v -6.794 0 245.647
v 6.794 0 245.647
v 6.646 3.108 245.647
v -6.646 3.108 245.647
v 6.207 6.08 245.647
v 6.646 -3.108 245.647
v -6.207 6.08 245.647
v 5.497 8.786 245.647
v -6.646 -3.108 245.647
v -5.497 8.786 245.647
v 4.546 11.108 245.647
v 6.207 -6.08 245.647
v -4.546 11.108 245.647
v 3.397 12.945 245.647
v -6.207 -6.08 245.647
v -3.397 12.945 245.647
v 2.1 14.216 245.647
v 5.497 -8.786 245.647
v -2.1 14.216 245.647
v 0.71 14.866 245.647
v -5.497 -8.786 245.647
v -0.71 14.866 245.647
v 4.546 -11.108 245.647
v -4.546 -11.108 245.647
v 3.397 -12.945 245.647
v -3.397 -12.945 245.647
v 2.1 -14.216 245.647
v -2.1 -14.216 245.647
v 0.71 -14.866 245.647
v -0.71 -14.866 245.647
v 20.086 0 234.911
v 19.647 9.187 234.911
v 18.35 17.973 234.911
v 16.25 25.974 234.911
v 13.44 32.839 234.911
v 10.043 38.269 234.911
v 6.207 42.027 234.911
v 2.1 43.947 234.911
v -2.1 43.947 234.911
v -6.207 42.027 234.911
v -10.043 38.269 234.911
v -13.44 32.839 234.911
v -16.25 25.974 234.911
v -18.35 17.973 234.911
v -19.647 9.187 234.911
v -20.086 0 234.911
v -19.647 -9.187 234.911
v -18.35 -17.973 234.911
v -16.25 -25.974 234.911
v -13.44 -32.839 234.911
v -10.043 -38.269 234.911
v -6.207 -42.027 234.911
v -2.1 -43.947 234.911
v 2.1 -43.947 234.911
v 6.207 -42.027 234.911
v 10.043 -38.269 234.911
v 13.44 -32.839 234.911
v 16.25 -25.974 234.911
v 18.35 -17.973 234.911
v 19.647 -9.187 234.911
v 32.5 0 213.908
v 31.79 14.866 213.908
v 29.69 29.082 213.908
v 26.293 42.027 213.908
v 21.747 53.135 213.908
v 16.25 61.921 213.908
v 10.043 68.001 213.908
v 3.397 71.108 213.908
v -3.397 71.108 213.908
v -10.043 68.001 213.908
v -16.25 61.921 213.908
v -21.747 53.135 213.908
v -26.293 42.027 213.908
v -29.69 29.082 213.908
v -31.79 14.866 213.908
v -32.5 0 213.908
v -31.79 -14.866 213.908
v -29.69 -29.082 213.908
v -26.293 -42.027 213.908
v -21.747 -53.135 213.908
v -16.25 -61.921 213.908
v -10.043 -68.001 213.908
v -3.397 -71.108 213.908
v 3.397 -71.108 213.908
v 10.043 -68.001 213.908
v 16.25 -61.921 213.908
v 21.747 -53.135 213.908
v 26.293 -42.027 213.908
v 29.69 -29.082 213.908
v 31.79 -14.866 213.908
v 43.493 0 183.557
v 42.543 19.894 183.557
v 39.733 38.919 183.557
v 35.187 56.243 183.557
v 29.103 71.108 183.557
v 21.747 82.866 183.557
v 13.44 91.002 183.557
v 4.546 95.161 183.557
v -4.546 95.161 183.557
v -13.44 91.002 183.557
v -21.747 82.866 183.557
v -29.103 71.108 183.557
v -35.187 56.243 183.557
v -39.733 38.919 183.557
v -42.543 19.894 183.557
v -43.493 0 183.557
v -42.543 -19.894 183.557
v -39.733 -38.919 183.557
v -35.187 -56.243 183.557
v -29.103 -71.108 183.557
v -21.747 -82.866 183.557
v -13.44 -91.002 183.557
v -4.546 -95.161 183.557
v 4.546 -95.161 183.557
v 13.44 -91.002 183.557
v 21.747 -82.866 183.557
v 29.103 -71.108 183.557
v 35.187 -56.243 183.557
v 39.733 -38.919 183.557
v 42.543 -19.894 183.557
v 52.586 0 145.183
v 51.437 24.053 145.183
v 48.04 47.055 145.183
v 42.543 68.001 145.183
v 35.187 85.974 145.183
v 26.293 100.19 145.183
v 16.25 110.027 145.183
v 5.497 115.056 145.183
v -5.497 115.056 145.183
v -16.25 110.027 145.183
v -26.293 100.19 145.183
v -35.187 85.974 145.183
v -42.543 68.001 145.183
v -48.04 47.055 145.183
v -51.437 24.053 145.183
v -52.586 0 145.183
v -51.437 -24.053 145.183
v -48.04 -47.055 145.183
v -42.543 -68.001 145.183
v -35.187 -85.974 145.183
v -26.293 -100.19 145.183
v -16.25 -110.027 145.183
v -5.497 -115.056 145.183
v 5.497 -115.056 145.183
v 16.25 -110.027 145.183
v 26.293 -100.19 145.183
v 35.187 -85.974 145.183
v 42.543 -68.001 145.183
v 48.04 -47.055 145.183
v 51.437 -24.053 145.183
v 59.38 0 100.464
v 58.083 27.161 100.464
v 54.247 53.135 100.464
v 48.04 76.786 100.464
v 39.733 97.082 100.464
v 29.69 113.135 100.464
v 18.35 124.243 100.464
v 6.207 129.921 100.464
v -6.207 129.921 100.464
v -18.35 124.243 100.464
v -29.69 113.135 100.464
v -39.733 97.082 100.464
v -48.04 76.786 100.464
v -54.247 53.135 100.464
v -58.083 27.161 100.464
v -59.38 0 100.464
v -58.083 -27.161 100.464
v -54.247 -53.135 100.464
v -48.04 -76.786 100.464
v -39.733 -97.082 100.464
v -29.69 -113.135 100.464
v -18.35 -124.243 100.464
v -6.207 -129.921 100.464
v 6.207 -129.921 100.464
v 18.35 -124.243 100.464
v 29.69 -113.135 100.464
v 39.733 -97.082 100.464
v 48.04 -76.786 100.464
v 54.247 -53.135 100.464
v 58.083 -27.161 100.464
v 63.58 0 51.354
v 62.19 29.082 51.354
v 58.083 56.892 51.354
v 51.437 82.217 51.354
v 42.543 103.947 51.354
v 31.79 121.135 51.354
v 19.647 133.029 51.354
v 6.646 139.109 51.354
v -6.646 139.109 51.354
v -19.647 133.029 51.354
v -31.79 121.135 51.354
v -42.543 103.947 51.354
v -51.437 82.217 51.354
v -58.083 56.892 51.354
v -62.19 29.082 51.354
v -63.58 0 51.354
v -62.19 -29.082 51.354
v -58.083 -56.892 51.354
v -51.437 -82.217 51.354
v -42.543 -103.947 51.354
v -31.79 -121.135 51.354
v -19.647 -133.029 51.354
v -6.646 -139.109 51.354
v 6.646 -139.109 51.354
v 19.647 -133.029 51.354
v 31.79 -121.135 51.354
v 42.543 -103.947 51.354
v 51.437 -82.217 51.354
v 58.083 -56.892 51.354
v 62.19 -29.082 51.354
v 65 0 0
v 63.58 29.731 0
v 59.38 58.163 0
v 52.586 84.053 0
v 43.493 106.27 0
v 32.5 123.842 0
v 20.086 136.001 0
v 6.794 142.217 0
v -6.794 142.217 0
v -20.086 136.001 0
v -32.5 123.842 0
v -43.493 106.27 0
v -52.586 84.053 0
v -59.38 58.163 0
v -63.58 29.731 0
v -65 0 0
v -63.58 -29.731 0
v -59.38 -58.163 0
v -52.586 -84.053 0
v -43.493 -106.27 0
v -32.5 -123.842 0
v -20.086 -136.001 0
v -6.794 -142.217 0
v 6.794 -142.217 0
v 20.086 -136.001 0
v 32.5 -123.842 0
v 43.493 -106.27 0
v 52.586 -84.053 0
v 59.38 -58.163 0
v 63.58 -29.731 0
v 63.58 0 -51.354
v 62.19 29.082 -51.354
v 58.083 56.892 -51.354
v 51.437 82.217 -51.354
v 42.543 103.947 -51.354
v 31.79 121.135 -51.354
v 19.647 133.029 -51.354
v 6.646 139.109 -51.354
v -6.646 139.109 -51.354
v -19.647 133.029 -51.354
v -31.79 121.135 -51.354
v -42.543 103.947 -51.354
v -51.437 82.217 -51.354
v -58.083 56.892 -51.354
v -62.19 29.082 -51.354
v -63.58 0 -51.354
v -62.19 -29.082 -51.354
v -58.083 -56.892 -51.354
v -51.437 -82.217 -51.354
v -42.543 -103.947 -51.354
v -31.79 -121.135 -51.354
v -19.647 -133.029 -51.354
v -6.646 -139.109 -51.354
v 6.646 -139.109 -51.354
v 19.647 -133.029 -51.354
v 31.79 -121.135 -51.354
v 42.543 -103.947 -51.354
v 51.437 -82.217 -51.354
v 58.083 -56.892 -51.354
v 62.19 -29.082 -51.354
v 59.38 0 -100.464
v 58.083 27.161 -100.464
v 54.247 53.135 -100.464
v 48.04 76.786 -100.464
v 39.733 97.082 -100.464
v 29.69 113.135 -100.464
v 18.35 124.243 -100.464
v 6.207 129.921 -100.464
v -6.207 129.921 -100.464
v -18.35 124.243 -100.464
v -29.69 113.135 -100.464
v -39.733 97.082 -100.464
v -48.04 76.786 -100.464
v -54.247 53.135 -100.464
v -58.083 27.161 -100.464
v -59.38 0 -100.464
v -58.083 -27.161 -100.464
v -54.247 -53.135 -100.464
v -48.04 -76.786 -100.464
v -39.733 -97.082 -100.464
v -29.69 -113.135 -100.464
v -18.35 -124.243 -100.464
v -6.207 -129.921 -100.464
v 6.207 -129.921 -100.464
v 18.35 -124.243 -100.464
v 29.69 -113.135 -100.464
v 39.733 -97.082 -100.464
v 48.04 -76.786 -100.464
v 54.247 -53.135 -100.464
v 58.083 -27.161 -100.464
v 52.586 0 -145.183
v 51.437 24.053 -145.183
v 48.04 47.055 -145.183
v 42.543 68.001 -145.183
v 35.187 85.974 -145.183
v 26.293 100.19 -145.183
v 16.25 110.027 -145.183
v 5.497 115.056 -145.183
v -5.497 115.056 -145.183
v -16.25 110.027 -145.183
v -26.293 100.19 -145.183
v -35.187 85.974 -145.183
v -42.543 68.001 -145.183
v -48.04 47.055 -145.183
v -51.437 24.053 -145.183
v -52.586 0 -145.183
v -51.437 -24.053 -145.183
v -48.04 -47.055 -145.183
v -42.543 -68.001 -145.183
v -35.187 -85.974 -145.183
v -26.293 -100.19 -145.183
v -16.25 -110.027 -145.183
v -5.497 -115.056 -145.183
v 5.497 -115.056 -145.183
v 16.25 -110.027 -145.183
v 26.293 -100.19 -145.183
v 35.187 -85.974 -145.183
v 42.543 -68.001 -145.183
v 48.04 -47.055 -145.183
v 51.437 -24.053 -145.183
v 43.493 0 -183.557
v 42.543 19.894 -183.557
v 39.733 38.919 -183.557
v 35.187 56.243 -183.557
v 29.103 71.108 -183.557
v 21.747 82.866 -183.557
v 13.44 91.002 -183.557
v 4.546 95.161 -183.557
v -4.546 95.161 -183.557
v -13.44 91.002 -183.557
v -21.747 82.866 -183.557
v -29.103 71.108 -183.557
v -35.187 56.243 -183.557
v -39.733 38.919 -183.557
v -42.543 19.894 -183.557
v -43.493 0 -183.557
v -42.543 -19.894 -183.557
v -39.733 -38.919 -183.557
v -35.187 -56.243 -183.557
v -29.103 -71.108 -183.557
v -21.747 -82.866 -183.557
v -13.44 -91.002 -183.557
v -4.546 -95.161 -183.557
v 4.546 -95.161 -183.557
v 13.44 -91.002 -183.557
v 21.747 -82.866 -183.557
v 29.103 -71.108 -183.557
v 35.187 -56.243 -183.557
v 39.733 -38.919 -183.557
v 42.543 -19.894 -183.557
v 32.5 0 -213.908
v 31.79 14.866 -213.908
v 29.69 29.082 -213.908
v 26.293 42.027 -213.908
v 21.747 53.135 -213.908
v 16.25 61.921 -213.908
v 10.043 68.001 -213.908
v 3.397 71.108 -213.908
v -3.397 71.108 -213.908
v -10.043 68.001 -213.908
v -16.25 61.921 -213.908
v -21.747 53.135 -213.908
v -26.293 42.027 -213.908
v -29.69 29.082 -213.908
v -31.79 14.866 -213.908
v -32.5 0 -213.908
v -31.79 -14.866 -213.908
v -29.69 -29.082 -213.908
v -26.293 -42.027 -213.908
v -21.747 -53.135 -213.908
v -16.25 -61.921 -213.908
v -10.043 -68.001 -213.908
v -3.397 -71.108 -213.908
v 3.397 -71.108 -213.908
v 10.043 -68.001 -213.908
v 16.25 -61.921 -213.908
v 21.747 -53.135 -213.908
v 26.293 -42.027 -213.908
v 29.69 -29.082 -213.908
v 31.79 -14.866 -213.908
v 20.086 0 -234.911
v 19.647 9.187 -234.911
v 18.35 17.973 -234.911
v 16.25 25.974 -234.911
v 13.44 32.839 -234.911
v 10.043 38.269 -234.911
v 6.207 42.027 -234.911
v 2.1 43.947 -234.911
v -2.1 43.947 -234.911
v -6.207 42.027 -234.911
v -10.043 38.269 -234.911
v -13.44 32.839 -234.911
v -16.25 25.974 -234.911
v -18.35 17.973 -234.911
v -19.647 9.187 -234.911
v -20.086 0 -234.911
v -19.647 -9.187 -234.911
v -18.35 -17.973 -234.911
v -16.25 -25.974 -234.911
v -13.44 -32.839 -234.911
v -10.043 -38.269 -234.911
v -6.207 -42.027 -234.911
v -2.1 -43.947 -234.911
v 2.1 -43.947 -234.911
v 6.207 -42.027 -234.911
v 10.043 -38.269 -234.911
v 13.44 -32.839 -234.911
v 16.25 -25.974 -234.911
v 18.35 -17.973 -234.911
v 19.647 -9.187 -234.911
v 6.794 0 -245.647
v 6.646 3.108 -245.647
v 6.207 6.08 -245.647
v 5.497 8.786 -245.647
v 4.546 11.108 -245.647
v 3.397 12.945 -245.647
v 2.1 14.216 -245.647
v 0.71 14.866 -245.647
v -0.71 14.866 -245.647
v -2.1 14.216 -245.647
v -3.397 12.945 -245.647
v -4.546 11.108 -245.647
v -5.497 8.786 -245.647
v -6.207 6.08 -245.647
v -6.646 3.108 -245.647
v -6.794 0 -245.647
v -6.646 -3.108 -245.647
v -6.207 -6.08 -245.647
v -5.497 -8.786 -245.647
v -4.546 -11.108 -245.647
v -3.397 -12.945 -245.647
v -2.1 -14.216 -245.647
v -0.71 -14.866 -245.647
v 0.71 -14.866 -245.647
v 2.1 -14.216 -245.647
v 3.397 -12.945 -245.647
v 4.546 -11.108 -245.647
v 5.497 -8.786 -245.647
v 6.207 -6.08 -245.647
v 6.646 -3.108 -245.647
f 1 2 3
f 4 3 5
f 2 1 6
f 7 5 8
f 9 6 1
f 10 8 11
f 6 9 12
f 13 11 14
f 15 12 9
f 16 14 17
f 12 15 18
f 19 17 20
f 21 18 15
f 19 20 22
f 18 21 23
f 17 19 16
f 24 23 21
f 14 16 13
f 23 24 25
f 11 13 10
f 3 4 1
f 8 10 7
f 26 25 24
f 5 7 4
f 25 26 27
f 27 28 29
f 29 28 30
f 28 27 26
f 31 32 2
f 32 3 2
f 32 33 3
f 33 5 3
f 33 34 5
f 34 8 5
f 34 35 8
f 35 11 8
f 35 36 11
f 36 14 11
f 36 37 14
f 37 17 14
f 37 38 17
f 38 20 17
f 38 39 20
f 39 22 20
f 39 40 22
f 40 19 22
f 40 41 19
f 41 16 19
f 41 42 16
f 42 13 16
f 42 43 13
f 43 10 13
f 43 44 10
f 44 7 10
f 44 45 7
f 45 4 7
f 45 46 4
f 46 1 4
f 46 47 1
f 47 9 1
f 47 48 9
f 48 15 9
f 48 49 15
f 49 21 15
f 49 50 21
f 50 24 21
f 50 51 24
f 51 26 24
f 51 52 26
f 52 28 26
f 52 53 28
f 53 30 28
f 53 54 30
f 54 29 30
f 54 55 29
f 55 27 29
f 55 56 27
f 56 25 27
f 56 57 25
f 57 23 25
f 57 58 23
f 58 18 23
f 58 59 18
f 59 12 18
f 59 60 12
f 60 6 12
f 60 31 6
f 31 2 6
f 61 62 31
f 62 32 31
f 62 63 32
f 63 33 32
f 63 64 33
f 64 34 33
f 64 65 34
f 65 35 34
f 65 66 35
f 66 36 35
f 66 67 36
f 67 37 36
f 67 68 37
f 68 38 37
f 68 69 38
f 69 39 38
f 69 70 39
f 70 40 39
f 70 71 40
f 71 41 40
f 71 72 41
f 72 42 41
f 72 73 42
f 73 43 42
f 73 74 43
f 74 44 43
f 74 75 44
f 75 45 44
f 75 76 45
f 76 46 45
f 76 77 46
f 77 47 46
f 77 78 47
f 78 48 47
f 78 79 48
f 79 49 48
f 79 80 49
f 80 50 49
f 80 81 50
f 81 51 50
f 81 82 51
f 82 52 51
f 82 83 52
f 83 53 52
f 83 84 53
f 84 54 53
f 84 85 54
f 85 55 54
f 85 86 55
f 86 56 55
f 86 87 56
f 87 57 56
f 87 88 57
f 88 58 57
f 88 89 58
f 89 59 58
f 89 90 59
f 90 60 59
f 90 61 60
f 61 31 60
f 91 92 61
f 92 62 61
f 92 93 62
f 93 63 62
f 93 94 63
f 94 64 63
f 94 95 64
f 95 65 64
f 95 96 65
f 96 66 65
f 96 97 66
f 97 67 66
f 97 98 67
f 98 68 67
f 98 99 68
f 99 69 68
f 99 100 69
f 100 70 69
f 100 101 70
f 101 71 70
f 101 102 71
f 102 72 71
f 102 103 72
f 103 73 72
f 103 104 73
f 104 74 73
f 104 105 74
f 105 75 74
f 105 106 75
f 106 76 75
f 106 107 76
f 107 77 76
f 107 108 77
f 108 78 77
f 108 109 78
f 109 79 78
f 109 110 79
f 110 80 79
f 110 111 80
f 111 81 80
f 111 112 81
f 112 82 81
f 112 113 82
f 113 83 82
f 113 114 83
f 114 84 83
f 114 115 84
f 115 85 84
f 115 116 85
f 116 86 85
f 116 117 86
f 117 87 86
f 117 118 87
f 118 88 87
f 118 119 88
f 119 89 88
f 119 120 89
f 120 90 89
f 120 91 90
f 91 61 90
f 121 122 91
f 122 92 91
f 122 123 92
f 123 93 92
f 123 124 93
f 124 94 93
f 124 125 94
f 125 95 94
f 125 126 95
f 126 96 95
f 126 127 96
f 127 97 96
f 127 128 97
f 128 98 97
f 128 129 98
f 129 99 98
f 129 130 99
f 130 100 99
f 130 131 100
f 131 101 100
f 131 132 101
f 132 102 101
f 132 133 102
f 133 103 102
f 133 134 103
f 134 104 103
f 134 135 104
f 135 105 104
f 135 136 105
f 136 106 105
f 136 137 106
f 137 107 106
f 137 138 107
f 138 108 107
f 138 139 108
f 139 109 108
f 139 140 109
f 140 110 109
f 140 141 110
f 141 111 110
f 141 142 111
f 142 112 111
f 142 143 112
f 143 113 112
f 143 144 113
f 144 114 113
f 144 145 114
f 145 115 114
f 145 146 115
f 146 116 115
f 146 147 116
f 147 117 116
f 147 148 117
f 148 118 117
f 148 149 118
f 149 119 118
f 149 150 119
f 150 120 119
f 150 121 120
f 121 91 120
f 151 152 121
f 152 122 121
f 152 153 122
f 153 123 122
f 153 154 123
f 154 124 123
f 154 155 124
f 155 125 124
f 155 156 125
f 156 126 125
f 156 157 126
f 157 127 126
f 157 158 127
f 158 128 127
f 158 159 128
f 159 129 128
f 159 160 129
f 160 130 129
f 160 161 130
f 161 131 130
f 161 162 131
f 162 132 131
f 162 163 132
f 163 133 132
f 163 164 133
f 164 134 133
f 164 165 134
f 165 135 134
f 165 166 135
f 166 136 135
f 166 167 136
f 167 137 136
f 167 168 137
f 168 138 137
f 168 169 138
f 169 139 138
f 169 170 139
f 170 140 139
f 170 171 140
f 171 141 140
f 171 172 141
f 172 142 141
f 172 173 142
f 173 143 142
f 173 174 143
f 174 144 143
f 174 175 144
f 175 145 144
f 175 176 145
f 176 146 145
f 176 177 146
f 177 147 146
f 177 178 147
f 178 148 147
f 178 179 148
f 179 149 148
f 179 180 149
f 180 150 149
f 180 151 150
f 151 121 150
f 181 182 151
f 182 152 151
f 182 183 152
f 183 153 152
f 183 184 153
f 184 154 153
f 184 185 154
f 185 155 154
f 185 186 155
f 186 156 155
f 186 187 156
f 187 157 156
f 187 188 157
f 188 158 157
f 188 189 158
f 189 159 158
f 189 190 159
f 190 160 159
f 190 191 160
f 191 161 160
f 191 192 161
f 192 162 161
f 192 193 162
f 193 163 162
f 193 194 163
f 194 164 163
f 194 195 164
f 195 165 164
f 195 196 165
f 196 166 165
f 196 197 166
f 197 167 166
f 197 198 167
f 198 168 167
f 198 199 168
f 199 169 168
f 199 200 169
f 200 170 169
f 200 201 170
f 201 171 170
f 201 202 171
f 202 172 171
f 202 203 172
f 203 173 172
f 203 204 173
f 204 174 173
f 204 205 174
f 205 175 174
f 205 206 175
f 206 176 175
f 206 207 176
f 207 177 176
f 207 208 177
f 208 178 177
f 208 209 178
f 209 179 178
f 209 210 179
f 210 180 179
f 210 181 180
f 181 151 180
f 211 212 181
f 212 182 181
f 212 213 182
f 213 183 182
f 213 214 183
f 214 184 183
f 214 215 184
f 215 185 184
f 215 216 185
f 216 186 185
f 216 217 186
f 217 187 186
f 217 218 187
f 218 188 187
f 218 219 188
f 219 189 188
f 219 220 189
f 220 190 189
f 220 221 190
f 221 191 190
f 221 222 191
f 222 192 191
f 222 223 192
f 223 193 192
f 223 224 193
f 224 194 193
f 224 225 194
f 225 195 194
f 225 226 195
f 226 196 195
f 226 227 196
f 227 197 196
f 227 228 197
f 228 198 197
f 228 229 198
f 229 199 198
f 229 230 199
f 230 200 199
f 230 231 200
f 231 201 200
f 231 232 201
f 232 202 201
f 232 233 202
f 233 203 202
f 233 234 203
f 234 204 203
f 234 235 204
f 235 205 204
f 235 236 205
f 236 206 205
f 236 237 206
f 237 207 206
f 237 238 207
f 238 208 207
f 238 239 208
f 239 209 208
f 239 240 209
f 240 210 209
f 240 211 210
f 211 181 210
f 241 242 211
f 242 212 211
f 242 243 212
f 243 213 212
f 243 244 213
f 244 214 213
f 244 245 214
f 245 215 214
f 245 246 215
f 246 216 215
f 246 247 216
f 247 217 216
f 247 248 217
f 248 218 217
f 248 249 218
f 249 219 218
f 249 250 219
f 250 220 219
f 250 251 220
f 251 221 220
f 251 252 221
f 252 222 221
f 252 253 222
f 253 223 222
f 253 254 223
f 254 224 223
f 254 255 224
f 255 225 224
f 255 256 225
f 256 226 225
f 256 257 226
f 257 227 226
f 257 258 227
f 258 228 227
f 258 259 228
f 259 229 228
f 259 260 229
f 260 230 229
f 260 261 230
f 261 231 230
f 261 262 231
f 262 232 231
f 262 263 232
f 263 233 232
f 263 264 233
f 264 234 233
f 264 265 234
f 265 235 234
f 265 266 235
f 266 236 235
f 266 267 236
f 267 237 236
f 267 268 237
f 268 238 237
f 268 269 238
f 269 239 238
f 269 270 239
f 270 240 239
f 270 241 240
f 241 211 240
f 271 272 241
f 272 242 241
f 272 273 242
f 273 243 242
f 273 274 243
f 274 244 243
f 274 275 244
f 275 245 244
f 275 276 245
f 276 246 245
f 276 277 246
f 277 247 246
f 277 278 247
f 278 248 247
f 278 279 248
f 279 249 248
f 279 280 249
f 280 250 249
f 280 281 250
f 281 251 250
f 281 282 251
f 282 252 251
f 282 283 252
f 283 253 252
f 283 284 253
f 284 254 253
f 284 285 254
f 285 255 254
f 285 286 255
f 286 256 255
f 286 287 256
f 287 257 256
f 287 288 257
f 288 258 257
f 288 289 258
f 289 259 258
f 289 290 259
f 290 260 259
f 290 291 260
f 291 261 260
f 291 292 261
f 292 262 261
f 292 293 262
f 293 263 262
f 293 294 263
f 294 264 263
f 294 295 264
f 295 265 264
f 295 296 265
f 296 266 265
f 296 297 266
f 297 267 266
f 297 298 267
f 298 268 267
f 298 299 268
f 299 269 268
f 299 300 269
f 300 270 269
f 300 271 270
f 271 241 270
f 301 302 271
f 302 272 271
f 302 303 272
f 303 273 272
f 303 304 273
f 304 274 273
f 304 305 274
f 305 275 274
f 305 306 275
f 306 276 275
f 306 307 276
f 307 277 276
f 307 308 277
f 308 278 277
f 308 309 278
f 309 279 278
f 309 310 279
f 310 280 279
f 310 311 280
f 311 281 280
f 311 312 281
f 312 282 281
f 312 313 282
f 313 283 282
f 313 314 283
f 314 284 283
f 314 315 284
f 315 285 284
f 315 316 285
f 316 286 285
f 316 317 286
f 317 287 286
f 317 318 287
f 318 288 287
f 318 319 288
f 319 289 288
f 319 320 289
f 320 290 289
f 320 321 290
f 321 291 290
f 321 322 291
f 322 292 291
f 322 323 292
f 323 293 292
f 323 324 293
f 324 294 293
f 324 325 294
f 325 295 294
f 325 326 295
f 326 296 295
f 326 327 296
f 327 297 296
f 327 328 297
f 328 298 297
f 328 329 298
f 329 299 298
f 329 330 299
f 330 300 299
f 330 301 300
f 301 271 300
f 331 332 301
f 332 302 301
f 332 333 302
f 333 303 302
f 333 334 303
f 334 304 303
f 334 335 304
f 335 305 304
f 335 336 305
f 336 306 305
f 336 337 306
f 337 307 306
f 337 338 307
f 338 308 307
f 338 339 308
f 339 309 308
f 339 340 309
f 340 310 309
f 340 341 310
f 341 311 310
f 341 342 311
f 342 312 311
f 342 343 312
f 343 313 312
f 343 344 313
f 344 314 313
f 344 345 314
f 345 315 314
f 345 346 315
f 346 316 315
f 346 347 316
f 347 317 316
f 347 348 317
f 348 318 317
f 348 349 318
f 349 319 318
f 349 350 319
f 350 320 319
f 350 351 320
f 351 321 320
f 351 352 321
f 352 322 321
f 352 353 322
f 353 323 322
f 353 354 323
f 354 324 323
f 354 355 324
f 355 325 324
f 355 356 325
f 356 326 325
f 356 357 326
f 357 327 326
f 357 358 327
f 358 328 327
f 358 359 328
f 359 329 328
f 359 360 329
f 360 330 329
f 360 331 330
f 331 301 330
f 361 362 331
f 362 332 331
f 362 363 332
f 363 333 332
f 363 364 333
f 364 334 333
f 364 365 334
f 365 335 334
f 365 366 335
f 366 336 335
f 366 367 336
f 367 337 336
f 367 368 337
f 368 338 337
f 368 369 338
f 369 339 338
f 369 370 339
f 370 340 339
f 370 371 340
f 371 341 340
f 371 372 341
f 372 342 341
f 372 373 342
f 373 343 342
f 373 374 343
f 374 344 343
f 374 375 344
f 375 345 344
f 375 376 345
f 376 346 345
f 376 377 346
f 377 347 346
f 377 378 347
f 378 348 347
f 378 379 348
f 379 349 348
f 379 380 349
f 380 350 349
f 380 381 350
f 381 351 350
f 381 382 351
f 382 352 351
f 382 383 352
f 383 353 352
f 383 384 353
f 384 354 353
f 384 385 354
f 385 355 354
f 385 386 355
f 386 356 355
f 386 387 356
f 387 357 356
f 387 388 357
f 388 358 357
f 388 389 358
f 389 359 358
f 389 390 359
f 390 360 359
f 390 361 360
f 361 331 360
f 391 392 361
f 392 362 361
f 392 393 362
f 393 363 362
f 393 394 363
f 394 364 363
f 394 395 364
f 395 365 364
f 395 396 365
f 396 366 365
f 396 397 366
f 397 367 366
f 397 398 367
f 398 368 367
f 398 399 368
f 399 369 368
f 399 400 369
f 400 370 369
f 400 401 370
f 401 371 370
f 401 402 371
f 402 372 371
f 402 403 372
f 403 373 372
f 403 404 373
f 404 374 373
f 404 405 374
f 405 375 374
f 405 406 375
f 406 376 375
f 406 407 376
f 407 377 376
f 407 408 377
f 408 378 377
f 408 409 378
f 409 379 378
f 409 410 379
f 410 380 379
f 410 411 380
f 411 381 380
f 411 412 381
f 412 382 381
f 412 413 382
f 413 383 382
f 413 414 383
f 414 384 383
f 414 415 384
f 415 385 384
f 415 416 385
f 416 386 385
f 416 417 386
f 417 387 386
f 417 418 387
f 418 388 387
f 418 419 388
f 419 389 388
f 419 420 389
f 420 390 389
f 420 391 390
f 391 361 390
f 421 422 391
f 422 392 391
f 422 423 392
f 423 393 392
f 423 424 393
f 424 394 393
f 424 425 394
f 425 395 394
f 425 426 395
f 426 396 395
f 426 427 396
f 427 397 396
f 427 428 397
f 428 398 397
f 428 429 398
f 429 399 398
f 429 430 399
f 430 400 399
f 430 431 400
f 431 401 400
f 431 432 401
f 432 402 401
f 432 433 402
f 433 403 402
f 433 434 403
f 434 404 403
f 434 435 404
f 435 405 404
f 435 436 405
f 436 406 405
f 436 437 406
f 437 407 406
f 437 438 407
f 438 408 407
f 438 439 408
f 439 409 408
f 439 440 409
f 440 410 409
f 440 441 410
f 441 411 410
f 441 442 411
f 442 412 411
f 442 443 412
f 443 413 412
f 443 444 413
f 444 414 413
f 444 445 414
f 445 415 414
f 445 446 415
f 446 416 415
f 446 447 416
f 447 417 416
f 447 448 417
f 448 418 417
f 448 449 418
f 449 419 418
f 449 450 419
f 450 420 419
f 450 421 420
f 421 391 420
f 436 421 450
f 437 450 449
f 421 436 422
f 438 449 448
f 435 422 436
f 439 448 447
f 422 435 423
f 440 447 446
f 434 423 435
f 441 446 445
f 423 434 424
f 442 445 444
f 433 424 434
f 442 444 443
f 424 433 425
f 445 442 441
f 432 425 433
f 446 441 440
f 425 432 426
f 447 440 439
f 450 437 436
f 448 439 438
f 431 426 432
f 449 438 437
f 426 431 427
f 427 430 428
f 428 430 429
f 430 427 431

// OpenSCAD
// Generated by SolidPython 1.0.1 on 2020-07-29 00:46:46


scale(v = [5, 11, 19]) {
	sphere(r = 13);
}
/***********************************************
*********      SolidPython code:      **********
************************************************
 
# import packages: SolidPython
from solid import *
from solid.utils import *
from itertools import chain, combinations, permutations


class Resize:

    def __init__(self, scad_file):
        self.scad_file = scad_file
        #self.scad_file = import_scad(scad_file)
        # cone/cylinder param:
        self.r1 = 0
        self.r2 = 0
        self.h = 0
        # rectangular prism param:
        self.w = 0
        self.l = 0
        # ellipse param:
        self.r = 0

    # import OpenScad code (file name corresponds to shape)


    # classify shape + parameters
    def assign(self, param1, param2, param3):
        if self.scad_file == 'cone.scad':
            self.r1 = param1
            self.r2 = param2
            self.h = param3
        elif self.scad_file == 'cylinder.scad':
            self.r1 = param1
            self.r2 = param2
            self.h = param3
        elif self.scad_file == 'rectangularPrism.scad':
            self.h = param1
            self.l = param2
            self.w = param3
        else:
            self.r = param1
            self.h = param2

    # resize parameters
    def iterate(self):
        x = range(3, 20, 2)
        i = 1
        if self.scad_file == 'cone.scad':
            tempList = list(permutations(x, 2))
            for temp in tempList:
                param1 = temp[0]
                param2 = temp[1]
                filepath = 'produced_scad_files/' + 'cone' + str(param1) + '_' + str(param2) + '_' + '.scad'
                scad_render_to_file(cylinder(h=param1, r1=param2, r2=0), filepath)

        elif self.scad_file == 'cylinder.scad':
            tempList = list(permutations(x, 3))
            for temp in tempList:
                param1 = temp[0]
                param2 = temp[1]
                filepath = 'produced_scad_files/' + 'cylinder' + str(param1) + '_' + str(param2) + '_' + '.scad'
                scad_render_to_file(cylinder(h=param1, r1=param2, r2=param2), filepath)

        elif self.scad_file == 'rectangularPrism.scad':
            tempList = list(permutations(x, 3))
            for temp in tempList:
                param1 = temp[0]
                param2 = temp[1]
                param3 = temp[2]
                filepath = 'produced_scad_files/' + 'rectangularPrism' + str(param1) + '_' + str(param2) + '_' + str(
                    param3) + '.scad'
                scad_render_to_file(cube(size=(param1, param2, param3)), filepath)

        elif self.scad_file == 'ellipse.scad':
            tempList = list(permutations(x, 4))
            for temp in tempList:
                param1 = temp[0]
                param2 = temp[1]
                param3 = temp[2]
                param4 = temp[3]
                filepath = 'produced_scad_files/' + 'ellipse' + str(param1) + '_' + str(param2) + '_' + str(param3) + '_' + str(param4) + '.scad'
                scad_render_to_file(scale([param1, param2, param3])(sphere(r=param4)), filepath)

    def render_to_scadfile(self):
        scad_render_to_file(scad, 'example.scad') 
 
************************************************/
